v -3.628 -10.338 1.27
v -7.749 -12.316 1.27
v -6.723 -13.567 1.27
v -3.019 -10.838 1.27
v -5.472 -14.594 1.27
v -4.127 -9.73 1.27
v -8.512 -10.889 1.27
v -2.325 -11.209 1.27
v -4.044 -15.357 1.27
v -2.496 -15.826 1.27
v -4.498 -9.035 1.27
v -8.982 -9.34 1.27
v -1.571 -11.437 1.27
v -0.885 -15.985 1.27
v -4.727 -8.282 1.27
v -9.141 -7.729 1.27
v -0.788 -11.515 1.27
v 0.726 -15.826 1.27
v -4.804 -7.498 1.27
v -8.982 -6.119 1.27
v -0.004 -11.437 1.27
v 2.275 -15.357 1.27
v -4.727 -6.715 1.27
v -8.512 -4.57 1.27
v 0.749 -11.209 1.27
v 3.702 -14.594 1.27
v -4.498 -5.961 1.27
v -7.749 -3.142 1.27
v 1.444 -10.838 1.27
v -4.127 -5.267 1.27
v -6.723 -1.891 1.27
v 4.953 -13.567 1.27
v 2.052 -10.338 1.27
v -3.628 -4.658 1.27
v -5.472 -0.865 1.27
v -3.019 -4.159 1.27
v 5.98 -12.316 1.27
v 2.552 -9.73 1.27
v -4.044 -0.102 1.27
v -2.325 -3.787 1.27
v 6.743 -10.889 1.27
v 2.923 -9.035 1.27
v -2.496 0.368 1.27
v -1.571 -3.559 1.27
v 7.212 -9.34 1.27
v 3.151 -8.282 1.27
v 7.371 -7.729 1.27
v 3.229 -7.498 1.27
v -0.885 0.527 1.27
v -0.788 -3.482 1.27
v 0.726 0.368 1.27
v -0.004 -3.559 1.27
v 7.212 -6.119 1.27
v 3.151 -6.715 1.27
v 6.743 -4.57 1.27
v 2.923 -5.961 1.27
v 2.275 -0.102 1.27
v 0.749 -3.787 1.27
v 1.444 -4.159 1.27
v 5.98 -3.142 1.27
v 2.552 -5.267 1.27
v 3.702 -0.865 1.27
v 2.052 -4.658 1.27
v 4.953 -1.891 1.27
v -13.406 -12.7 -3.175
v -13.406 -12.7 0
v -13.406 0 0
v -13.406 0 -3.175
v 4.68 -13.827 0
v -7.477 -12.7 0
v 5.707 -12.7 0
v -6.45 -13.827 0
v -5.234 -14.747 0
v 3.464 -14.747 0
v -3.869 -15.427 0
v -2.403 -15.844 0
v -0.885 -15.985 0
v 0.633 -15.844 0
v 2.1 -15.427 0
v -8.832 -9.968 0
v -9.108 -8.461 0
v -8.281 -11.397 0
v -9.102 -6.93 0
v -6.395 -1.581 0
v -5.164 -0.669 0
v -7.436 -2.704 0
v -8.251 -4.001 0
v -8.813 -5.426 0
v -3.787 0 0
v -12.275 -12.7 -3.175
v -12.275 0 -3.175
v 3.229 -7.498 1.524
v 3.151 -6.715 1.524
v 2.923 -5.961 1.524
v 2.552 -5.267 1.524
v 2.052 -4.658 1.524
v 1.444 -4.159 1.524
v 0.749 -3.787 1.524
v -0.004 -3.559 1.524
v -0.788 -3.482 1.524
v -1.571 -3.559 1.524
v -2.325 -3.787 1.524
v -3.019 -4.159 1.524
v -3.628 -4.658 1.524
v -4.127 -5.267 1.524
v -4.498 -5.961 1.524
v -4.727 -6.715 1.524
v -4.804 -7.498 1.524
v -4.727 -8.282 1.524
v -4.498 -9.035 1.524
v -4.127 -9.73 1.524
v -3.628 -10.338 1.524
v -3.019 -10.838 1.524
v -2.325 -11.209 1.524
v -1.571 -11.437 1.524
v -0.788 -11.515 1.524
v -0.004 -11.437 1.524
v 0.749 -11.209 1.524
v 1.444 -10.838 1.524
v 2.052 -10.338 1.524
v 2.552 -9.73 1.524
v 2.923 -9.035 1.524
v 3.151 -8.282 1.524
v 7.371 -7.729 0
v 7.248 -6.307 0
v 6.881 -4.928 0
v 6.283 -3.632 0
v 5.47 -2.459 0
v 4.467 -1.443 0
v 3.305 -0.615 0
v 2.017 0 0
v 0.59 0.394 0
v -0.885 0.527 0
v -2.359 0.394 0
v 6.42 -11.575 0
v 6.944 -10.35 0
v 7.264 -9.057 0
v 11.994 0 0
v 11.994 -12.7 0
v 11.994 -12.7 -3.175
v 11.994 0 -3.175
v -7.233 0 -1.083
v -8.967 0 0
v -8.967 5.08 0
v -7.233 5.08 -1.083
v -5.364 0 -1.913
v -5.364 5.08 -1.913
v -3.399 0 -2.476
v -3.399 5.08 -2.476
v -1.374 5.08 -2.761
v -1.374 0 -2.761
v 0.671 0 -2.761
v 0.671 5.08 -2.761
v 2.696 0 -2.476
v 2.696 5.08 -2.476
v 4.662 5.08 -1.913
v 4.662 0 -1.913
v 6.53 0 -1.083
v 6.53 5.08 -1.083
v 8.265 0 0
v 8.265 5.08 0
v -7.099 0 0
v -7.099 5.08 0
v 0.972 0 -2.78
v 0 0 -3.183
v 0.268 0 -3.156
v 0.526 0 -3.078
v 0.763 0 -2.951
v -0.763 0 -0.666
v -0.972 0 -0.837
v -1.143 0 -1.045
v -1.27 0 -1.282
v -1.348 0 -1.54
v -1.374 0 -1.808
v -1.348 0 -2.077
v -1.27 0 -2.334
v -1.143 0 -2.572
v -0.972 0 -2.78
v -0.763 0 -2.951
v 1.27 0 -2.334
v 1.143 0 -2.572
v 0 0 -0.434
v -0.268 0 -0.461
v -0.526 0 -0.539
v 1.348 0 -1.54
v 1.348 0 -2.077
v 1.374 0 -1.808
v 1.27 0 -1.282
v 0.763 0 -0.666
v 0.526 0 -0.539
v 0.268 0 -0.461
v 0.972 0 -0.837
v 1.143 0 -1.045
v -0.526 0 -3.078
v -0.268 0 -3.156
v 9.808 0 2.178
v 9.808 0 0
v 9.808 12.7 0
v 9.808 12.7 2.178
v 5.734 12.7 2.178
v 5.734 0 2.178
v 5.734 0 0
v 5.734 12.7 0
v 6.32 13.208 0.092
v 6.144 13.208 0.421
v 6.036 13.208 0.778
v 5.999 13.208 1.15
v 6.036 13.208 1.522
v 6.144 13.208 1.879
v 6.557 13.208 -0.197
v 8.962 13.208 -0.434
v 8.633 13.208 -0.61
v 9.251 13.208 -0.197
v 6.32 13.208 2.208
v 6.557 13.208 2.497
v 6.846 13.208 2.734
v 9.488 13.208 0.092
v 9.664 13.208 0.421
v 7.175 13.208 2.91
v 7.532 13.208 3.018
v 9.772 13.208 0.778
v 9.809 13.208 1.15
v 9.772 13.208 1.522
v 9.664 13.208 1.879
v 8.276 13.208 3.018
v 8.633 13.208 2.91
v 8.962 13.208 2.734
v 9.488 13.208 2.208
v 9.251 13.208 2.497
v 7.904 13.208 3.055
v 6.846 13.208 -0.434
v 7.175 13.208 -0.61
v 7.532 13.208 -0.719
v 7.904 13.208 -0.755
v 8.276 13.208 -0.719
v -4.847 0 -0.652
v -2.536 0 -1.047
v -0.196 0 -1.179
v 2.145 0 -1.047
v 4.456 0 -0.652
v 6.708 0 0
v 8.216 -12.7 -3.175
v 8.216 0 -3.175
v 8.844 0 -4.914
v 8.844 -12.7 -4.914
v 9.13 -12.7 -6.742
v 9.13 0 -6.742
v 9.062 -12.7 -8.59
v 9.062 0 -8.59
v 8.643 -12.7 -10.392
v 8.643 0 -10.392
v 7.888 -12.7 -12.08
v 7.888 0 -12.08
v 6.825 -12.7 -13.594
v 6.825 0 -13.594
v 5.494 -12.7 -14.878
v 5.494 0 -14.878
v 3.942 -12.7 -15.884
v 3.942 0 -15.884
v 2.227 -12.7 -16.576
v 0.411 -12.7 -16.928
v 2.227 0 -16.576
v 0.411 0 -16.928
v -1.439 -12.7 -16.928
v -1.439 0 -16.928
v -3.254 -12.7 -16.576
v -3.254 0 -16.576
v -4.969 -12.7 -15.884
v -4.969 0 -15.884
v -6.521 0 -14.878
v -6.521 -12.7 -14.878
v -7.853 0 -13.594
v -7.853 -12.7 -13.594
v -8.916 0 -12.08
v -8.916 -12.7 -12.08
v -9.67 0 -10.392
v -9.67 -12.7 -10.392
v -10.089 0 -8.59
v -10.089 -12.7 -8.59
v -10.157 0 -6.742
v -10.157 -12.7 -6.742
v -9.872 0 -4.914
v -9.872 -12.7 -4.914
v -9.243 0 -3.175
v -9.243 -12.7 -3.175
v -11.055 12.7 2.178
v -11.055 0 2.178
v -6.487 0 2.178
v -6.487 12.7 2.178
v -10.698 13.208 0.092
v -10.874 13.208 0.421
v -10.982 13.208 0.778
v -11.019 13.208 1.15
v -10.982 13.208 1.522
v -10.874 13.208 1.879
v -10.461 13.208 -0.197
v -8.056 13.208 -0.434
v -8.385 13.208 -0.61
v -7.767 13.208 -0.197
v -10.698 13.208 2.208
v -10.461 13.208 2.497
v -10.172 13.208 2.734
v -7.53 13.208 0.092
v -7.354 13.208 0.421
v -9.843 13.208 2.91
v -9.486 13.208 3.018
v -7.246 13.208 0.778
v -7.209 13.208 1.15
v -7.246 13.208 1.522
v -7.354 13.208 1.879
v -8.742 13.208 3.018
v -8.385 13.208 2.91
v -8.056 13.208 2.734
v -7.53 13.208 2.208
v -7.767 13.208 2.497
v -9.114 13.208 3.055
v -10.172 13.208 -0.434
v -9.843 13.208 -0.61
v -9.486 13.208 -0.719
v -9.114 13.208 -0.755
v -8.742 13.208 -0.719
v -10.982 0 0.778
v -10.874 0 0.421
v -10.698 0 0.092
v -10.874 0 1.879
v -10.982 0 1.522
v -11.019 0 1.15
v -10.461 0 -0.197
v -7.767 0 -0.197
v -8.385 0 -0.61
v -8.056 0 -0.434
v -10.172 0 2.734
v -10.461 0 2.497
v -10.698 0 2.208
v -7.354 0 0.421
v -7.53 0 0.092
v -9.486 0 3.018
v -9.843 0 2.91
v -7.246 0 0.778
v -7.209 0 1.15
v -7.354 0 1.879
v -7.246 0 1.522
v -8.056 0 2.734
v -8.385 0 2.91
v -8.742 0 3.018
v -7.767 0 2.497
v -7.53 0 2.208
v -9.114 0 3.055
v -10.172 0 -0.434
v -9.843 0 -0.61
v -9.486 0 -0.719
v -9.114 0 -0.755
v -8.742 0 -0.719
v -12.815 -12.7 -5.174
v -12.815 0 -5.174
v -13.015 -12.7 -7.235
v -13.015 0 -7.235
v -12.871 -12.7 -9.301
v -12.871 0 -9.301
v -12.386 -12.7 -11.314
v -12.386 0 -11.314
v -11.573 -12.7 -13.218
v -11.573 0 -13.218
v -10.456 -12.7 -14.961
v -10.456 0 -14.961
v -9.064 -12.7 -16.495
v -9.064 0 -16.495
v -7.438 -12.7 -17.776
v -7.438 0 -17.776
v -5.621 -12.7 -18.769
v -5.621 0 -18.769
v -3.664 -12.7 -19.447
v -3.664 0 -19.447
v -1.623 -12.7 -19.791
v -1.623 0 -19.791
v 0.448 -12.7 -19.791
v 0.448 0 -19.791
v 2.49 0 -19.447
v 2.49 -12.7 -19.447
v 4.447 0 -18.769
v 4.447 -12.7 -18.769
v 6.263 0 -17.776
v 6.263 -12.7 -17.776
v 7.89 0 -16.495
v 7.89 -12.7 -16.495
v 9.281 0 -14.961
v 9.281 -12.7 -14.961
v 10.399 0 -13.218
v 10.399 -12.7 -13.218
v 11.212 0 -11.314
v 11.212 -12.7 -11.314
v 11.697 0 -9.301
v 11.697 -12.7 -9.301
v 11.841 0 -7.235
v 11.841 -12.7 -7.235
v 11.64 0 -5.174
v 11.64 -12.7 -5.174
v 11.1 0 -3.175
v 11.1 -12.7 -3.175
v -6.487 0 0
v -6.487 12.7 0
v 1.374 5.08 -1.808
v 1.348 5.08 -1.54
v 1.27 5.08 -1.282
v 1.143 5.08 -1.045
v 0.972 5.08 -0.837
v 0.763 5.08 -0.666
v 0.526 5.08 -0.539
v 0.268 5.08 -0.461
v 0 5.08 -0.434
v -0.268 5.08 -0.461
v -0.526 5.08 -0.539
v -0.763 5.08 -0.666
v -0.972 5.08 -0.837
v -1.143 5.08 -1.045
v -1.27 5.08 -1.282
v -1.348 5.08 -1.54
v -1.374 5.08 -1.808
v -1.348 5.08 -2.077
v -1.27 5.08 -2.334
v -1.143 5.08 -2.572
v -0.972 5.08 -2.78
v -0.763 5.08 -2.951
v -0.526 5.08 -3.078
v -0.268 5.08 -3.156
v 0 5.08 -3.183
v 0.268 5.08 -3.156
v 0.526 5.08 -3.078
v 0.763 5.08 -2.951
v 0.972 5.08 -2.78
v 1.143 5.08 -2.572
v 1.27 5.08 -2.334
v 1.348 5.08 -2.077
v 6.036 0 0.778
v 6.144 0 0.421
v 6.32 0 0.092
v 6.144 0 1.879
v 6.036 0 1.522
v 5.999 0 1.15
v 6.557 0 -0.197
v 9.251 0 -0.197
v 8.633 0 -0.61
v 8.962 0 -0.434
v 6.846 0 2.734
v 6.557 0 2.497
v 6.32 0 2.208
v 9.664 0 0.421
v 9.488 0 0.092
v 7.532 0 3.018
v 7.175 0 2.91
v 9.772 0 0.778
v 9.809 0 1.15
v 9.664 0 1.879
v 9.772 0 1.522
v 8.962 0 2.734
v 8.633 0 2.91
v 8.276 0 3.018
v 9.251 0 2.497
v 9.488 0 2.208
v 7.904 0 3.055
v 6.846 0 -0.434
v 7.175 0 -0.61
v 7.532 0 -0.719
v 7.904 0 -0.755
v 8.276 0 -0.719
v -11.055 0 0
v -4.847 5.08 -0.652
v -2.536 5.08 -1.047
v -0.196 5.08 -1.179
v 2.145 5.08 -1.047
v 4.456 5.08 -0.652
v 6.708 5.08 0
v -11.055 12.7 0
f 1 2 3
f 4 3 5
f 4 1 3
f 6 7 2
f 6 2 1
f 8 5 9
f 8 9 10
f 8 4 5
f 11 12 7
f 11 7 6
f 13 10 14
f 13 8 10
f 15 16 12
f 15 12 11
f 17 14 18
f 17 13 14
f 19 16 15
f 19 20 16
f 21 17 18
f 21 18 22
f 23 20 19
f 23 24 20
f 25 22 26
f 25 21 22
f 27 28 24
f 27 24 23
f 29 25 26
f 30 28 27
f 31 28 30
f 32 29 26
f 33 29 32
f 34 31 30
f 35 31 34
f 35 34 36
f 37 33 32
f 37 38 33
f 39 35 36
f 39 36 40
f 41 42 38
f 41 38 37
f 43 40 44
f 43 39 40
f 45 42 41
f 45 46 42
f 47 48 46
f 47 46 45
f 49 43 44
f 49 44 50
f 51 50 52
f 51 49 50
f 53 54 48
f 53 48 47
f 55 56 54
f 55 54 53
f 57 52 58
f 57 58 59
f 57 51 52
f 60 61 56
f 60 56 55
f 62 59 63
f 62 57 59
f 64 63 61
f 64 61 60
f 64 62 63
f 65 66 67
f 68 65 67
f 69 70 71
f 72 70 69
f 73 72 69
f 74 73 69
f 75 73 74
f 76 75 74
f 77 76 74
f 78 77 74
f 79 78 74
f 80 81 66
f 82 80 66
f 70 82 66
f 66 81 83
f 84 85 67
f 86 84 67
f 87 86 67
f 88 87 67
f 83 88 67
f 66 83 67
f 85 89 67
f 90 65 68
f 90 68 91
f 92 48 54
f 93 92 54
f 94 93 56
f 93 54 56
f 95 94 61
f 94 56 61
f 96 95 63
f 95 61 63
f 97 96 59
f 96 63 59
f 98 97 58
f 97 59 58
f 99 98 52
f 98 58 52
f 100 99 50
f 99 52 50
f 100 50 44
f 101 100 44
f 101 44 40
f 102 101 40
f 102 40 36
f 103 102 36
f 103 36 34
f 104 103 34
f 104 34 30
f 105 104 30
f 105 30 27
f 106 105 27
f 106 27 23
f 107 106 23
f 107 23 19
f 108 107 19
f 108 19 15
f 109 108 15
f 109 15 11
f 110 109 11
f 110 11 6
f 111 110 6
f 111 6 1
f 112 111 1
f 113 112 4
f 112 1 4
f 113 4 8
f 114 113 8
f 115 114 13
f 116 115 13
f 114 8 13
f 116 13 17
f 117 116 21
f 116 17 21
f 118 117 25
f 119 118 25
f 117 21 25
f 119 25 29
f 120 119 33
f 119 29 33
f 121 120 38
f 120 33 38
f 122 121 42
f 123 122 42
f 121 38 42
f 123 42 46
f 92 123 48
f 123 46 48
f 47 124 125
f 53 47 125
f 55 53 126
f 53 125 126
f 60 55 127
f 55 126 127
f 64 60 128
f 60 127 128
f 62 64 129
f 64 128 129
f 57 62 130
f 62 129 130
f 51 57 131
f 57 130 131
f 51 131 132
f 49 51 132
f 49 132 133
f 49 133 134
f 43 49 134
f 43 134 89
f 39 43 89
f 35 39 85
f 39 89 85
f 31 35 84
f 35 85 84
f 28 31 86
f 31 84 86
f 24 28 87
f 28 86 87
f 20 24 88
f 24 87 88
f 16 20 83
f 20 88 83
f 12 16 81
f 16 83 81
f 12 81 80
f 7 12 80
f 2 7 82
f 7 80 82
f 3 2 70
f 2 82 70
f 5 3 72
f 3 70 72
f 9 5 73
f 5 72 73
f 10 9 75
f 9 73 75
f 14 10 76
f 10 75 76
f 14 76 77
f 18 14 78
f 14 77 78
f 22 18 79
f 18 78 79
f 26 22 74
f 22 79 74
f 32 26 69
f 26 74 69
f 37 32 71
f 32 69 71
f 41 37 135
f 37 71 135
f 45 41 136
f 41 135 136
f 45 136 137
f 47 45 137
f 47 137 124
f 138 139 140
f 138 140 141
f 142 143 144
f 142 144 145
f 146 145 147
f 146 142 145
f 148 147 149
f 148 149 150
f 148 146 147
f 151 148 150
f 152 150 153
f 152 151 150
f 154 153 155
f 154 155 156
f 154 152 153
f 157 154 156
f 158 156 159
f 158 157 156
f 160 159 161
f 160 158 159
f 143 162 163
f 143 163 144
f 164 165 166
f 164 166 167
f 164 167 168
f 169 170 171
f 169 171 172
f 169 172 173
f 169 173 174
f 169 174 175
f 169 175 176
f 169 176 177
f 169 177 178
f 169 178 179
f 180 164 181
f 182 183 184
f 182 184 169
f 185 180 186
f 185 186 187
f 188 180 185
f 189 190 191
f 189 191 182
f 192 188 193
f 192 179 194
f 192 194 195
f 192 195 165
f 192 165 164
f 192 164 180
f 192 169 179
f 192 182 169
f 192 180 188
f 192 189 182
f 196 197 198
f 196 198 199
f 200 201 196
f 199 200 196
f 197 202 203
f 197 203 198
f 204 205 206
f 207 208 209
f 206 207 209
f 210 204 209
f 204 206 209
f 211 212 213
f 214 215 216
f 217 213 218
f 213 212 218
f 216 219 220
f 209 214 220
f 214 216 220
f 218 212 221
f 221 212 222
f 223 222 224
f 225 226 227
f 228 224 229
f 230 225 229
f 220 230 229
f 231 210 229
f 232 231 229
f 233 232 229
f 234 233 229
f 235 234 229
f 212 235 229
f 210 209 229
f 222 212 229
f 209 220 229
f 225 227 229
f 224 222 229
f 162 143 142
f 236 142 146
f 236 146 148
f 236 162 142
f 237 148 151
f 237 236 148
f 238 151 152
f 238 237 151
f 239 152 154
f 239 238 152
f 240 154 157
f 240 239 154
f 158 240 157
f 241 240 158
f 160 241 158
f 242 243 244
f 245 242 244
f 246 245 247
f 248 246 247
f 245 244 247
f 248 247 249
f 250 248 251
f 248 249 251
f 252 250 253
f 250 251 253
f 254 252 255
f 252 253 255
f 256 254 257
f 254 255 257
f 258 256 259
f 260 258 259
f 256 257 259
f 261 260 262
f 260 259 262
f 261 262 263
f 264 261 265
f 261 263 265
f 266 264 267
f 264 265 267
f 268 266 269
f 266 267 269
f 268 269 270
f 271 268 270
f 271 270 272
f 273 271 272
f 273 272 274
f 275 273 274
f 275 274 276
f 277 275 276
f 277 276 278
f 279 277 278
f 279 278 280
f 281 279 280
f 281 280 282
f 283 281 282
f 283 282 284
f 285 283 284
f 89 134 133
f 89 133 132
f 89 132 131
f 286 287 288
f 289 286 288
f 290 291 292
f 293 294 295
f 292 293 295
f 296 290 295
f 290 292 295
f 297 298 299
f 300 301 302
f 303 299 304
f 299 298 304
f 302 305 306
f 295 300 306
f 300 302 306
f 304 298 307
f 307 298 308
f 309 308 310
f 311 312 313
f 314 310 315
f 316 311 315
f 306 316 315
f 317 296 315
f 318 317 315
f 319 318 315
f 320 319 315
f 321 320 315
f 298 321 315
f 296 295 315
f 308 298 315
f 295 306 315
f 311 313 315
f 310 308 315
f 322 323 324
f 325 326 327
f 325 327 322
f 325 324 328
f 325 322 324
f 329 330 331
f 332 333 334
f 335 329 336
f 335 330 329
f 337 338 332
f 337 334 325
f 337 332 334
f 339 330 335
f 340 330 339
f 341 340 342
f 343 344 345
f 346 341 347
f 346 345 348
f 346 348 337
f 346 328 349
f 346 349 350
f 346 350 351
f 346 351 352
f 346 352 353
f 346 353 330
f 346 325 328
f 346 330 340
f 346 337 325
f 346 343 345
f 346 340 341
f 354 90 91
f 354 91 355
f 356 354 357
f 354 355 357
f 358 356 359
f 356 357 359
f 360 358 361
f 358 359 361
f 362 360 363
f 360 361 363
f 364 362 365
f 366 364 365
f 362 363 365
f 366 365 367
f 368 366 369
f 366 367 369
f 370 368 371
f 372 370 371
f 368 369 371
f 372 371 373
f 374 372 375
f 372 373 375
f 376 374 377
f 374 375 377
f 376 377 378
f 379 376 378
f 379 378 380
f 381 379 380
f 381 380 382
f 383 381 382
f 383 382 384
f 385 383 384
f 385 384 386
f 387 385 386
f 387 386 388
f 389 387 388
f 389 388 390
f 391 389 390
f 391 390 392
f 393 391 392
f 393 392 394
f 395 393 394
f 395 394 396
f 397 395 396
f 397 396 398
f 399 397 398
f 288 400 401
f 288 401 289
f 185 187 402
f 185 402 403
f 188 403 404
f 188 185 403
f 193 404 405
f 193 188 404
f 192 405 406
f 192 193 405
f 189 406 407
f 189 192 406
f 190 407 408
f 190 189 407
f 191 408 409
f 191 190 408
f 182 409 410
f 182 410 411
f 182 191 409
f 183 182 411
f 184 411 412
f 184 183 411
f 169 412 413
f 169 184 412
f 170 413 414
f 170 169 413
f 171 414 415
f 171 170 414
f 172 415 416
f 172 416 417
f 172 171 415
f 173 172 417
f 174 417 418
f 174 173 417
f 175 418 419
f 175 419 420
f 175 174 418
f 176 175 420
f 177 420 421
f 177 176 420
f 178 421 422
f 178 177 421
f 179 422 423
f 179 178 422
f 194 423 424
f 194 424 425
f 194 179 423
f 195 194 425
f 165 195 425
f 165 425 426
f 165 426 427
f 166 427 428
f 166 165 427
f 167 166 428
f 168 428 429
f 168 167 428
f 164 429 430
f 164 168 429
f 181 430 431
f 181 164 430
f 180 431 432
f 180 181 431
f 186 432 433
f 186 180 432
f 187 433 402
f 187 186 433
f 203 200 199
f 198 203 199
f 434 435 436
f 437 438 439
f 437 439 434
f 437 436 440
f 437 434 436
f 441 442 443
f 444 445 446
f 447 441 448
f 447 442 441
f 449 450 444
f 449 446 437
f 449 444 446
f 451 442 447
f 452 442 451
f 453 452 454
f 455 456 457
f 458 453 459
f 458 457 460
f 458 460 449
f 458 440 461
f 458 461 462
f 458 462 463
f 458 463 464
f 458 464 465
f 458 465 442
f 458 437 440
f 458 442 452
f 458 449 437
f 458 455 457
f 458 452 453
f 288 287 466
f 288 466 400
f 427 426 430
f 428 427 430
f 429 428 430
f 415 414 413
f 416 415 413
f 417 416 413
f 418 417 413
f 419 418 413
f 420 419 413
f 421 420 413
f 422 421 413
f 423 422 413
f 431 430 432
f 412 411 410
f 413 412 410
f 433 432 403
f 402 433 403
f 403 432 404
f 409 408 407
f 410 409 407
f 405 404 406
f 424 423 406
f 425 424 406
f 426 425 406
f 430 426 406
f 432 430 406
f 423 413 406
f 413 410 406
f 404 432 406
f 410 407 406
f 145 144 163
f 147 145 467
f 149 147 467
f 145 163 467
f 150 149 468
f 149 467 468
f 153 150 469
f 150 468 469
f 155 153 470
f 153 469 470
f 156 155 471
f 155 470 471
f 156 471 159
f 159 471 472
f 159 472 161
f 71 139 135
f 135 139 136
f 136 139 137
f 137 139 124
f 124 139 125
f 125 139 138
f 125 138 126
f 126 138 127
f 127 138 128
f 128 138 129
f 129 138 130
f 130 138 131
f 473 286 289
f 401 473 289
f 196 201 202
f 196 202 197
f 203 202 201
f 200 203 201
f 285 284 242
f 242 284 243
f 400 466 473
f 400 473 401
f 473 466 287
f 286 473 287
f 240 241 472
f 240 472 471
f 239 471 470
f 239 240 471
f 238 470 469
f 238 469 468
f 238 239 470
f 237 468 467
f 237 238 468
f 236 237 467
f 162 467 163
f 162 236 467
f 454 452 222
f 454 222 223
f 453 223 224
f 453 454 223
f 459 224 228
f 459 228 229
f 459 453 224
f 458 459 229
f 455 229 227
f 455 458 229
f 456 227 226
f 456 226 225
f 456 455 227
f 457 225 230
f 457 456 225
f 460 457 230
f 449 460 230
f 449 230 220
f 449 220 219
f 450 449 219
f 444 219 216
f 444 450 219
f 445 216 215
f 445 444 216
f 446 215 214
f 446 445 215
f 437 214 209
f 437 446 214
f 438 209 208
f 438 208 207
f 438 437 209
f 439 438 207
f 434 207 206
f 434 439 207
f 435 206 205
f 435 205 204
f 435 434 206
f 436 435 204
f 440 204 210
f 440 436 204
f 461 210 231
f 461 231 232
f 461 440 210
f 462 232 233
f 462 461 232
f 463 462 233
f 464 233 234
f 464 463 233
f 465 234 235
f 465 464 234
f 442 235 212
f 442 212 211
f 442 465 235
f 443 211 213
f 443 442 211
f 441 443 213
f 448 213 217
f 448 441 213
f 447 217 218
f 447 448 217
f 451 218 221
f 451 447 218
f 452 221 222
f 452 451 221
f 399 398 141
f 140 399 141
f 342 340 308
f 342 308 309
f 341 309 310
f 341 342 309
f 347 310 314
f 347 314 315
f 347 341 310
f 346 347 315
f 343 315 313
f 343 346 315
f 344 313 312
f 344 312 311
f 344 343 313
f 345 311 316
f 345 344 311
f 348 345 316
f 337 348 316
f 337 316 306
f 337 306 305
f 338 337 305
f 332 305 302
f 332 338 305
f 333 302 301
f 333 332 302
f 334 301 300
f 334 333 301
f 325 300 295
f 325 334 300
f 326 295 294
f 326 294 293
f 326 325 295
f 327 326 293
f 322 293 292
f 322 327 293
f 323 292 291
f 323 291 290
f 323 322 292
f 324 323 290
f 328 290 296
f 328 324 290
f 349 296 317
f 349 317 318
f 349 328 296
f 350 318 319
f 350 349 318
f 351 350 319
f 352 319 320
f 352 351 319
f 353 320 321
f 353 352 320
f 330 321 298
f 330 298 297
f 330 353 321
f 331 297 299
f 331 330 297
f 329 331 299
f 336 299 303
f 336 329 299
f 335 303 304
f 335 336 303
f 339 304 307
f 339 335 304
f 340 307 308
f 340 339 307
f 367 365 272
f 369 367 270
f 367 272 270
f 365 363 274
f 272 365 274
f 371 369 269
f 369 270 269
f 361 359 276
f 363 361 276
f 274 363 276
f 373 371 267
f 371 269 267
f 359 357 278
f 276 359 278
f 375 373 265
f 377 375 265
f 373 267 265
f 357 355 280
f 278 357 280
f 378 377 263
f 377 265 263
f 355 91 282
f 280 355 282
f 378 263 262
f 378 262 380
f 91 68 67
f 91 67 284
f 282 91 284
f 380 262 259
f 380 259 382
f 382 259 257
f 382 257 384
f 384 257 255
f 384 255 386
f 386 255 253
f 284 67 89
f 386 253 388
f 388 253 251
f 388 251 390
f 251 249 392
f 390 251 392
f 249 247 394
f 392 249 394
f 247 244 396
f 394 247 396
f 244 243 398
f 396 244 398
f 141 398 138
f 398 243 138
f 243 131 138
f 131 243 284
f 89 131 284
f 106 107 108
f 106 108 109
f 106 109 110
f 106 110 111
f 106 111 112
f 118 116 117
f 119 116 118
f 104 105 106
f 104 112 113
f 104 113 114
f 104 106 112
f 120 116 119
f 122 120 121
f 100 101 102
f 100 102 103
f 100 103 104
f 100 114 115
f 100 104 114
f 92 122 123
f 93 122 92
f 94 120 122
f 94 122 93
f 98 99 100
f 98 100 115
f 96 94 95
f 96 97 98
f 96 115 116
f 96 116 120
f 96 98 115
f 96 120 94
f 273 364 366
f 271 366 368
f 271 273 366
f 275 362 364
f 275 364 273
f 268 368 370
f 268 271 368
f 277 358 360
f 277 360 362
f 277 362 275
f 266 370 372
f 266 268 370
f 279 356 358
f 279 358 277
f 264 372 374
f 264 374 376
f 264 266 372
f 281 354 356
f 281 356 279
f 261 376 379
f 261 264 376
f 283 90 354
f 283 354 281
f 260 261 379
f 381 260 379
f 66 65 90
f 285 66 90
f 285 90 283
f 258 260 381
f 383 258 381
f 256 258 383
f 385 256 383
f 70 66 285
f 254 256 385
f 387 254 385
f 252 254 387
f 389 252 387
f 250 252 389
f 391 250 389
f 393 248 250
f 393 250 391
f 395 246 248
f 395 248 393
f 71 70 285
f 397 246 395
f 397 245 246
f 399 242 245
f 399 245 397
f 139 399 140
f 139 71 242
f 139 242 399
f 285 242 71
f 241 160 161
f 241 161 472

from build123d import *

# Parameters (mm, degrees)
F0_W      = 25.4
F0_H      = 12.7
F1_DEPTH  = 3.175
F3_DEPTH  = 12.7
F4_R      = 8.255919
F5_DEPTH  = 1.27
F6_R      = 4.016388
F7_DEPTH  = 1.524
F8_W      = 4.073842
F8_H      = 2.178376
F8_W_2    = 4.567642
F9_DEPTH  = 12.7
F11_DEPTH = 5.08
F12_R     = 1.905
F13_DEPTH = 13.208
F14_R     = 1.374255
F15_DEPTH = 5.08


with BuildPart() as f1:
    # F0 (on Top) → F1 (new body)
    with BuildSketch(Plane.XY):
        with Locations((-0.705556, -6.35)):
            Rectangle(F0_W, F0_H)
    extrude(amount=-F1_DEPTH)

    # F2 (on Front) → F3 (join)
    with BuildSketch(Plane.XZ):
        with BuildLine():
            Line((-6.82654, 0), (-10.570128, 0))
            ThreePointArc((-10.570128, 0), (-0.587228, -19.834257), (9.395671, 0))
            Line((9.395671, 0), (5.79889, 0))
            ThreePointArc((5.79889, 0), (-0.513825, -16.97284), (-6.82654, 0))
        make_face()
    extrude(amount=F3_DEPTH)

    # F4 (on Top) → F5 (join)
    with BuildSketch(Plane.XY):
        with Locations((-0.884902, -7.729196)):
            Circle(F4_R)
    extrude(amount=F5_DEPTH)

    # F6 (on Top) → F7 (join)
    with BuildSketch(Plane.XY):
        with Locations((-0.787807, -7.498141)):
            Circle(F6_R)
    extrude(amount=F7_DEPTH)


with BuildPart() as f9:
    # F8 (on Front) → F9 (new body)
    with BuildSketch(Plane.XZ):
        with Locations((7.771082, 1.089188)):
            Rectangle(F8_W, F8_H)
        with Locations((-8.771187, 1.089188)):
            Rectangle(F8_W_2, F8_H)
    extrude(amount=-F9_DEPTH)


with BuildPart() as f11:
    # F10 (on Front) → F11 (new body)
    with BuildSketch(Plane.XZ):
        with BuildLine():
            Line((-7.098918, 0), (-8.96747, 0))
            ThreePointArc((-8.96747, 0), (-0.351368, -2.796372), (8.264735, 0))
            Line((8.264735, 0), (6.707608, 0))
            ThreePointArc((6.707608, 0), (-0.195655, -1.179251), (-7.098918, 0))
        make_face()
    extrude(amount=-F11_DEPTH)


with BuildPart() as f13:
    # F12 (on Front) → F13 (new body)
    with BuildSketch(Plane.XZ):
        with Locations((-9.11403, 1.149864)):
            Circle(F12_R)
        with Locations((7.90397, 1.149864)):
            Circle(F12_R)
    extrude(amount=-F13_DEPTH)


with BuildPart() as f15:
    # F14 (on Front) → F15 (new body)
    with BuildSketch(Plane.XZ):
        with Locations((0, -1.808403)):
            Circle(F14_R)
    extrude(amount=-F15_DEPTH)


solid = Compound([f1.part, f9.part, f11.part, f13.part, f15.part])
